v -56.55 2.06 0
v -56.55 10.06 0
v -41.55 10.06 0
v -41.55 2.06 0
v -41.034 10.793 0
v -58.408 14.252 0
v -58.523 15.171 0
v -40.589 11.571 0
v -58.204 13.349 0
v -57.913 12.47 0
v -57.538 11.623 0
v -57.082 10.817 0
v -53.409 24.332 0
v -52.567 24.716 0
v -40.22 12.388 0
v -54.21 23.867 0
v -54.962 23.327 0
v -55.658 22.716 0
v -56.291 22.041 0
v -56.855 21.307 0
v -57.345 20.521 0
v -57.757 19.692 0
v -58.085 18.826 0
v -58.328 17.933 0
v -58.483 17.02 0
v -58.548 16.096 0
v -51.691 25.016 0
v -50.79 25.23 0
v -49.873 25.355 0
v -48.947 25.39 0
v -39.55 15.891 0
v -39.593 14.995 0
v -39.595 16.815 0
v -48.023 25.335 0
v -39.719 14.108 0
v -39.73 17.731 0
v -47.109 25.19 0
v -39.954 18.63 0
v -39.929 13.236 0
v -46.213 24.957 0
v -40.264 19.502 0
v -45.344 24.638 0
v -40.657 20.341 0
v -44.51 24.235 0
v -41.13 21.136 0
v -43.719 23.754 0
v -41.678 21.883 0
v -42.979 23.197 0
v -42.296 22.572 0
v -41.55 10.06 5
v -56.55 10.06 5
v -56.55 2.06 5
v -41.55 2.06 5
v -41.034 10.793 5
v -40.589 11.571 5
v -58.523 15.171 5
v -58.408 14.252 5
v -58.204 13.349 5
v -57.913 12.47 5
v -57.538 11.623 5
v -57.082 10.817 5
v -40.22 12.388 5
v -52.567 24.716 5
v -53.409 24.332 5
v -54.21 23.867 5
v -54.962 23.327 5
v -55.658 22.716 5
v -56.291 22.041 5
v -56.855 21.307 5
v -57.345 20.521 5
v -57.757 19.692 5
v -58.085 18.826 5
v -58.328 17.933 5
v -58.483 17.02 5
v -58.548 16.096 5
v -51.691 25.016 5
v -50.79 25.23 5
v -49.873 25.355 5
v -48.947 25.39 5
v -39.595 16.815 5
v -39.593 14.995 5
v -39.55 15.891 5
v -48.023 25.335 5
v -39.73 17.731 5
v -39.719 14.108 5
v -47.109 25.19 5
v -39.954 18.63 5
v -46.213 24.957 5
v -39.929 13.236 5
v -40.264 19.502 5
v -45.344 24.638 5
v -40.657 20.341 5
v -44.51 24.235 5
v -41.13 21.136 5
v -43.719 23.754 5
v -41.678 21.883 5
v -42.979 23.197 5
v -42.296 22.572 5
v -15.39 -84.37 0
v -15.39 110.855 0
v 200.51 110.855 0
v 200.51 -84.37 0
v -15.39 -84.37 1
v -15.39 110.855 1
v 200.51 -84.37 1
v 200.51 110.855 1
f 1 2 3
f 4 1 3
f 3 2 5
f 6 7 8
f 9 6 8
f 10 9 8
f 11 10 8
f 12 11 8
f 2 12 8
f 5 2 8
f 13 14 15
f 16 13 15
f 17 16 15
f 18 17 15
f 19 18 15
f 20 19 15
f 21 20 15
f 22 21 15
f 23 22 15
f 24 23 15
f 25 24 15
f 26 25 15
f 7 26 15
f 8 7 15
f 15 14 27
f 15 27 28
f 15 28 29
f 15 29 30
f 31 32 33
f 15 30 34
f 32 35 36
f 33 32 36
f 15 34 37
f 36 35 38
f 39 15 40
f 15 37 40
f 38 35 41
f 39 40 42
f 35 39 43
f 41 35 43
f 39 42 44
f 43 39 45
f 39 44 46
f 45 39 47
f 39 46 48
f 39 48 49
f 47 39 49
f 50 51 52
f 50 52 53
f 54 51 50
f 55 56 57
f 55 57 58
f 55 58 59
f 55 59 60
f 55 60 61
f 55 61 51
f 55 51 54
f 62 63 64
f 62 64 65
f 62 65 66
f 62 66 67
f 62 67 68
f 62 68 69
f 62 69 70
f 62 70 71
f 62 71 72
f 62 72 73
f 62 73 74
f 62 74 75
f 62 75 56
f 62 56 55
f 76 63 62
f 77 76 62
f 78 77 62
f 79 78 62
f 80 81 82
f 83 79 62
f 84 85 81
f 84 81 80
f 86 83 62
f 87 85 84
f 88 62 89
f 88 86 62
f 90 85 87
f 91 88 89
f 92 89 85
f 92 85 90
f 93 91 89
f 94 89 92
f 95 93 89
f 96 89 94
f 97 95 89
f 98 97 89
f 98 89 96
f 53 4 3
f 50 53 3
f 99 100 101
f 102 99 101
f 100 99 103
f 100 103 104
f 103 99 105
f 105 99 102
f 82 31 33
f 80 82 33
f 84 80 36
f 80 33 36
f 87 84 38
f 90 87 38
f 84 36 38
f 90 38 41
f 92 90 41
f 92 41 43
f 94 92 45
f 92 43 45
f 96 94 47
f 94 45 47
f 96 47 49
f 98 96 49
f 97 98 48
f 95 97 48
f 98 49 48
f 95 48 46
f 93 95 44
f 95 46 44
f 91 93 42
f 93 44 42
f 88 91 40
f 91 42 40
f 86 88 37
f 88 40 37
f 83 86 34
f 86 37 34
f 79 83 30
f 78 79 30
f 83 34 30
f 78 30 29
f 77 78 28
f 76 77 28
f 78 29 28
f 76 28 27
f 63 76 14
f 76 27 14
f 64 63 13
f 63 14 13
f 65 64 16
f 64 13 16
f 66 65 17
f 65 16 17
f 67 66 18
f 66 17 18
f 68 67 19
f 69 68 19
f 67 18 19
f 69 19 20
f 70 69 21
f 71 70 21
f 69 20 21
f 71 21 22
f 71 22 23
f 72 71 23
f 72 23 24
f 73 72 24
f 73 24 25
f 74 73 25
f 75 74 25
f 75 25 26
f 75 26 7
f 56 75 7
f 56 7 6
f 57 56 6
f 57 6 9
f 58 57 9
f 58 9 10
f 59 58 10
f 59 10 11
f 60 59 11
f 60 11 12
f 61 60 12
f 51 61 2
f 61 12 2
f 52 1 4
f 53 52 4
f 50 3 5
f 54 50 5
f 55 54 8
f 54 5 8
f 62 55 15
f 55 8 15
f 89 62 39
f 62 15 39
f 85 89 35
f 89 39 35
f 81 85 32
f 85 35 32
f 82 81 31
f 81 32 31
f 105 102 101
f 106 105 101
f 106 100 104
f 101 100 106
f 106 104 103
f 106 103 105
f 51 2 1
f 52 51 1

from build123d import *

# Parameters (mm, degrees)
F1_DEPTH = 5
F2_W     = 215.9
F2_H     = 195.2248938816
F3_DEPTH = 1


with BuildPart() as f1:
    # F0 (on Top) → F1 (new body)
    with BuildSketch(Plane.XY):
        with BuildLine():
            ThreePointArc((-41.5502086074, 10.0596904365), (-40.0641082296, 12.8084353299), (-39.5502086074, 15.8906423313))
            ThreePointArc((-39.5502086074, 15.8906423313), (-52.1324156089, 24.8767427091), (-56.5502086074, 10.0596904365))
            Line((-56.5502086074, 10.0596904365), (-41.5502086074, 10.0596904365))
        make_face()
        with BuildLine():
            Line((-41.5502086074, 10.0596904365), (-56.5502086074, 10.0596904365))
            ThreePointArc((-56.5502086074, 10.0596904365), (-49.0502086074, 6.3906423313), (-41.5502086074, 10.0596904365))
        make_face()
        with BuildLine():
            ThreePointArc((-41.5502086074, 10.0596904365), (-49.0502086074, 6.3906423313), (-56.5502086074, 10.0596904365))
            Line((-56.5502086074, 10.0596904365), (-56.5502086074, 2.0596904365))
            Line((-56.5502086074, 2.0596904365), (-41.5502086074, 2.0596904365))
            Line((-41.5502086074, 2.0596904365), (-41.5502086074, 10.0596904365))
        make_face()
    extrude(amount=F1_DEPTH)


with BuildPart() as f3:
    # F2 (on Top) → F3 (new body)
    with BuildSketch(Plane.XY):
        with Locations((92.5600202754, 13.2428300567)):
            Rectangle(F2_W, F2_H)
    extrude(amount=F3_DEPTH)


solid = Compound([f1.part, f3.part])
